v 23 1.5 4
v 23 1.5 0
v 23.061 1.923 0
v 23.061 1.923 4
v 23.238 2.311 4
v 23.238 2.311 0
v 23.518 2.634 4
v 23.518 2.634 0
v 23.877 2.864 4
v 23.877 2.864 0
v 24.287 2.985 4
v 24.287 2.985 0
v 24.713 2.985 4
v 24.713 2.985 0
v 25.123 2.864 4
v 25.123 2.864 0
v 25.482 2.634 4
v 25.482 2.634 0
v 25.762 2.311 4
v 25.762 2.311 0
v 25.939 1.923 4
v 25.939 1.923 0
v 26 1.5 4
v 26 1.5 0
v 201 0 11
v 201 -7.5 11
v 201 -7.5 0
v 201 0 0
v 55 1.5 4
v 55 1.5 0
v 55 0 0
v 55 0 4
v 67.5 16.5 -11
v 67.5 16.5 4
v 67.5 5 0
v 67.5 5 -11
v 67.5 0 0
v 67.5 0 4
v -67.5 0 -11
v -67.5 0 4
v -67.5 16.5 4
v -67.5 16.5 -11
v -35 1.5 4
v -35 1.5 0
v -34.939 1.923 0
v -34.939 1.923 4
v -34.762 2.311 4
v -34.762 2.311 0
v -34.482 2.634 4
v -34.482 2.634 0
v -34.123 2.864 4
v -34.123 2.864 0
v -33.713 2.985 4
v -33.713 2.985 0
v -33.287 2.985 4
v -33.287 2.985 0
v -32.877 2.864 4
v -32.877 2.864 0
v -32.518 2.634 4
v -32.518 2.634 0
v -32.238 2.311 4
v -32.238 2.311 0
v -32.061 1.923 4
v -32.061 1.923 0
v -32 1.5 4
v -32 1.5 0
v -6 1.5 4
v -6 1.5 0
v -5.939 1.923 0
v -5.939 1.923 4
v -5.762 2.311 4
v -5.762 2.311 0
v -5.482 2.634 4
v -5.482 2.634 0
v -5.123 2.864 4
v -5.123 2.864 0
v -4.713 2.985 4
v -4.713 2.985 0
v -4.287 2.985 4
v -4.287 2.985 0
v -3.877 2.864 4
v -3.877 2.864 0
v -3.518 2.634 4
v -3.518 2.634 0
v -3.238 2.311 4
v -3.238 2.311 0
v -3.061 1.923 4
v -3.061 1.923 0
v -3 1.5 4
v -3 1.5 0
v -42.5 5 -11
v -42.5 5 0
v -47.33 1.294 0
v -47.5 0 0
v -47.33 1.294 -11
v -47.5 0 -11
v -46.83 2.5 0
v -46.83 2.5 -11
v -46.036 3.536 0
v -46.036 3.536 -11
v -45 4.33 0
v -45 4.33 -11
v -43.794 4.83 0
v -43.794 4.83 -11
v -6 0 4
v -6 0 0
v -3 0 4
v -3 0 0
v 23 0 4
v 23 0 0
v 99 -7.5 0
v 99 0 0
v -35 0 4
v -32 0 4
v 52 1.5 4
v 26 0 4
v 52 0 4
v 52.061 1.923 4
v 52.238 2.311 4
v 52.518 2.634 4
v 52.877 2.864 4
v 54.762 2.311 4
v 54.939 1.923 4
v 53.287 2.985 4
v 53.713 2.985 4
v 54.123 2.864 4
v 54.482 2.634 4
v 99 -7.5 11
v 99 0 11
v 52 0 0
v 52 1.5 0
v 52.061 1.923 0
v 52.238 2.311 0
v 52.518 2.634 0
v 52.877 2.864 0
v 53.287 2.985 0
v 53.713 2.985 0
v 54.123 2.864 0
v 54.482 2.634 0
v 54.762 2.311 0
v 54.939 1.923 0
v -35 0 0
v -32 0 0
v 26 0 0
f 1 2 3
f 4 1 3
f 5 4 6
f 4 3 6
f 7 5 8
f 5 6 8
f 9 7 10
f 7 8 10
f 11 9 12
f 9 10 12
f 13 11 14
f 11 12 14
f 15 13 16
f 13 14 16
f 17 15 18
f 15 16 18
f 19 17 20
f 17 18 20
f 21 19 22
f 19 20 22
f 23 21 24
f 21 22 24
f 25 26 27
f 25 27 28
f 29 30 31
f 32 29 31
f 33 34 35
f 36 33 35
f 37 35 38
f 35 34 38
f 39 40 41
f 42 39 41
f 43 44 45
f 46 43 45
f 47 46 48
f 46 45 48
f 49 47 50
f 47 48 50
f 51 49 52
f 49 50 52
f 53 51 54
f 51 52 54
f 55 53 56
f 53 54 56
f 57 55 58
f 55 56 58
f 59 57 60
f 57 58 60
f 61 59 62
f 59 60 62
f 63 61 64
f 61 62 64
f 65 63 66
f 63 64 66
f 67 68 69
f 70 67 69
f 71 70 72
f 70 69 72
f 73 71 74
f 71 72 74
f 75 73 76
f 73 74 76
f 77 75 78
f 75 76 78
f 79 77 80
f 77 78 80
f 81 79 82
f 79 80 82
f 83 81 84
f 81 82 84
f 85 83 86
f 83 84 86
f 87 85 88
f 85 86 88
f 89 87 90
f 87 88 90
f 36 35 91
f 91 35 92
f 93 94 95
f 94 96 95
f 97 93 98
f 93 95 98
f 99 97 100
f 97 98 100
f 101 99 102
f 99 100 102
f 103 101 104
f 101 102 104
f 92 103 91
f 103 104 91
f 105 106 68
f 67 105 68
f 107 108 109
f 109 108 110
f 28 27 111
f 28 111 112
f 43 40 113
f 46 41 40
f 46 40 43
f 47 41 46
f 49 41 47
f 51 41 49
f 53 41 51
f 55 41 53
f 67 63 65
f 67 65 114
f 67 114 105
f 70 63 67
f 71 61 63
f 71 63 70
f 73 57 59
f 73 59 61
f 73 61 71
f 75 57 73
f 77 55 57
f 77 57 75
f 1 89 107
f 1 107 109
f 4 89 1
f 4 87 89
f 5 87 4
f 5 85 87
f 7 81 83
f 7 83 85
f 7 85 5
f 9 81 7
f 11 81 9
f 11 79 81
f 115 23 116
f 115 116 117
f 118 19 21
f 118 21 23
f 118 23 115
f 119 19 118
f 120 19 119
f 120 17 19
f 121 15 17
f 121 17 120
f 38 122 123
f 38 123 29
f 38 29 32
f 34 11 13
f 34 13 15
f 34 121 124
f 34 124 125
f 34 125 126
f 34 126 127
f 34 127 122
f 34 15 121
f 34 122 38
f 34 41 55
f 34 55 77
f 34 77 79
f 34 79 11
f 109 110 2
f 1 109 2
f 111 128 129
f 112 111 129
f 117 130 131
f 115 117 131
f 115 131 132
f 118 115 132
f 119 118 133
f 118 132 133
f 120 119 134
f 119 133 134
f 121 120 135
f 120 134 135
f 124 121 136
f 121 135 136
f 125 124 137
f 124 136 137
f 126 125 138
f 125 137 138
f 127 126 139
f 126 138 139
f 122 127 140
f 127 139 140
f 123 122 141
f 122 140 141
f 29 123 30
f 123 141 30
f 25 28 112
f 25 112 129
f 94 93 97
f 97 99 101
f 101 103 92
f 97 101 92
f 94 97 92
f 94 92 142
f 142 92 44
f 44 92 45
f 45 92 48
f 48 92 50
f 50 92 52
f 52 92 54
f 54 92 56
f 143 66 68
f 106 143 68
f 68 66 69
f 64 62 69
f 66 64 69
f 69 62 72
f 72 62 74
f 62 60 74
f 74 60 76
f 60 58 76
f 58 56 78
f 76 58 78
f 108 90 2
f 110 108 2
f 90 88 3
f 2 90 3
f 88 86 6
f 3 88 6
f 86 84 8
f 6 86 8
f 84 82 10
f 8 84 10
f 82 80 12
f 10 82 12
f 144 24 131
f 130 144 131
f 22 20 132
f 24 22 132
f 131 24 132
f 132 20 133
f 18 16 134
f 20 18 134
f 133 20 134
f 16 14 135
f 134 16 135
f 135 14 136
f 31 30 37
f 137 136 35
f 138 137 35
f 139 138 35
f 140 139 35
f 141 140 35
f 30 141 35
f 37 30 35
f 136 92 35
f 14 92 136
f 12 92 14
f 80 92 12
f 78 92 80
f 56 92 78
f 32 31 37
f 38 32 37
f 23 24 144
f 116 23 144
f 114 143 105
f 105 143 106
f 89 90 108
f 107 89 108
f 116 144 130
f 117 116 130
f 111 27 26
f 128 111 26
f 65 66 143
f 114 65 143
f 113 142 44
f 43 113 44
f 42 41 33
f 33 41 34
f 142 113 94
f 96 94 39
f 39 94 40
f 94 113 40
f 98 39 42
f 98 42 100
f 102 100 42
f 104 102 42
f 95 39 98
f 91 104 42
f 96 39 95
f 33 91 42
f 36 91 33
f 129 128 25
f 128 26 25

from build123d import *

# Parameters (mm, degrees)
F1_DEPTH = 4
F3_DEPTH = 11
F5_W     = 7.5
F5_H     = 11
F6_DEPTH = 51
F7_R     = 4.99999


# Not quite as in the source:
# - a fillet or chamfer is up to 0.001 mm smaller than in the source, because OpenCascade refuses the exact size


with BuildPart() as f1:
    # F0 (on Top) → F1 (new body)
    with BuildSketch(Plane.XY):
        with BuildLine():
            Line((55, 0), (67.5, 0))
            Line((67.5, 0), (67.5, 16.5))
            Line((67.5, 16.5), (-67.5, 16.5))
            Line((-67.5, 16.5), (-67.5, 0))
            Line((-67.5, 0), (-35, 0))
            Line((-35, 0), (-35, 1.5))
            ThreePointArc((-35, 1.5), (-33.5, 3), (-32, 1.5))
            Line((-32, 1.5), (-32, 0))
            Line((-32, 0), (-6, 0))
            Line((-6, 0), (-6, 1.5))
            ThreePointArc((-6, 1.5), (-4.5, 3), (-3, 1.5))
            Line((-3, 1.5), (-3, 0))
            Line((-3, 0), (23, 0))
            Line((23, 0), (23, 1.5))
            ThreePointArc((23, 1.5), (24.5, 3), (26, 1.5))
            Line((26, 1.5), (26, 0))
            Line((26, 0), (52, 0))
            Line((52, 0), (52, 1.5))
            ThreePointArc((52, 1.5), (53.5, 3), (55, 1.5))
            Line((55, 1.5), (55, 0))
        make_face()
    extrude(amount=F1_DEPTH)

    # F2 (on face) → F3 (join)
    with BuildSketch(Plane(origin=(0, 0, 0), x_dir=(1, 0, 0), z_dir=(0, 0, -1))):
        Polygon((67.5, -16.5), (67.5, -4.9999998882), (-47.5, -4.9999998882), (-47.5, 0), (-67.5, 0), (-67.5, -16.5), align=None)
    extrude(amount=F3_DEPTH)

    # F7 (radius 5 in the source; OpenCascade refuses exactly that, so slightly less here)
    f7_edges = [f1.edges().sort_by_distance(p)[0] for p in [
        (-47.5, 5, -5.5),
    ]]
    fillet(f7_edges, radius=F7_R)


with BuildPart() as f6:
    # F5 (on offset) → F6 (new body, symmetric)
    with BuildSketch(Plane.YZ.offset(150)):
        with Locations((-3.75, 5.5)):
            Rectangle(F5_W, F5_H)
    extrude(amount=F6_DEPTH, both=True)


solid = Compound([f1.part, f6.part])
